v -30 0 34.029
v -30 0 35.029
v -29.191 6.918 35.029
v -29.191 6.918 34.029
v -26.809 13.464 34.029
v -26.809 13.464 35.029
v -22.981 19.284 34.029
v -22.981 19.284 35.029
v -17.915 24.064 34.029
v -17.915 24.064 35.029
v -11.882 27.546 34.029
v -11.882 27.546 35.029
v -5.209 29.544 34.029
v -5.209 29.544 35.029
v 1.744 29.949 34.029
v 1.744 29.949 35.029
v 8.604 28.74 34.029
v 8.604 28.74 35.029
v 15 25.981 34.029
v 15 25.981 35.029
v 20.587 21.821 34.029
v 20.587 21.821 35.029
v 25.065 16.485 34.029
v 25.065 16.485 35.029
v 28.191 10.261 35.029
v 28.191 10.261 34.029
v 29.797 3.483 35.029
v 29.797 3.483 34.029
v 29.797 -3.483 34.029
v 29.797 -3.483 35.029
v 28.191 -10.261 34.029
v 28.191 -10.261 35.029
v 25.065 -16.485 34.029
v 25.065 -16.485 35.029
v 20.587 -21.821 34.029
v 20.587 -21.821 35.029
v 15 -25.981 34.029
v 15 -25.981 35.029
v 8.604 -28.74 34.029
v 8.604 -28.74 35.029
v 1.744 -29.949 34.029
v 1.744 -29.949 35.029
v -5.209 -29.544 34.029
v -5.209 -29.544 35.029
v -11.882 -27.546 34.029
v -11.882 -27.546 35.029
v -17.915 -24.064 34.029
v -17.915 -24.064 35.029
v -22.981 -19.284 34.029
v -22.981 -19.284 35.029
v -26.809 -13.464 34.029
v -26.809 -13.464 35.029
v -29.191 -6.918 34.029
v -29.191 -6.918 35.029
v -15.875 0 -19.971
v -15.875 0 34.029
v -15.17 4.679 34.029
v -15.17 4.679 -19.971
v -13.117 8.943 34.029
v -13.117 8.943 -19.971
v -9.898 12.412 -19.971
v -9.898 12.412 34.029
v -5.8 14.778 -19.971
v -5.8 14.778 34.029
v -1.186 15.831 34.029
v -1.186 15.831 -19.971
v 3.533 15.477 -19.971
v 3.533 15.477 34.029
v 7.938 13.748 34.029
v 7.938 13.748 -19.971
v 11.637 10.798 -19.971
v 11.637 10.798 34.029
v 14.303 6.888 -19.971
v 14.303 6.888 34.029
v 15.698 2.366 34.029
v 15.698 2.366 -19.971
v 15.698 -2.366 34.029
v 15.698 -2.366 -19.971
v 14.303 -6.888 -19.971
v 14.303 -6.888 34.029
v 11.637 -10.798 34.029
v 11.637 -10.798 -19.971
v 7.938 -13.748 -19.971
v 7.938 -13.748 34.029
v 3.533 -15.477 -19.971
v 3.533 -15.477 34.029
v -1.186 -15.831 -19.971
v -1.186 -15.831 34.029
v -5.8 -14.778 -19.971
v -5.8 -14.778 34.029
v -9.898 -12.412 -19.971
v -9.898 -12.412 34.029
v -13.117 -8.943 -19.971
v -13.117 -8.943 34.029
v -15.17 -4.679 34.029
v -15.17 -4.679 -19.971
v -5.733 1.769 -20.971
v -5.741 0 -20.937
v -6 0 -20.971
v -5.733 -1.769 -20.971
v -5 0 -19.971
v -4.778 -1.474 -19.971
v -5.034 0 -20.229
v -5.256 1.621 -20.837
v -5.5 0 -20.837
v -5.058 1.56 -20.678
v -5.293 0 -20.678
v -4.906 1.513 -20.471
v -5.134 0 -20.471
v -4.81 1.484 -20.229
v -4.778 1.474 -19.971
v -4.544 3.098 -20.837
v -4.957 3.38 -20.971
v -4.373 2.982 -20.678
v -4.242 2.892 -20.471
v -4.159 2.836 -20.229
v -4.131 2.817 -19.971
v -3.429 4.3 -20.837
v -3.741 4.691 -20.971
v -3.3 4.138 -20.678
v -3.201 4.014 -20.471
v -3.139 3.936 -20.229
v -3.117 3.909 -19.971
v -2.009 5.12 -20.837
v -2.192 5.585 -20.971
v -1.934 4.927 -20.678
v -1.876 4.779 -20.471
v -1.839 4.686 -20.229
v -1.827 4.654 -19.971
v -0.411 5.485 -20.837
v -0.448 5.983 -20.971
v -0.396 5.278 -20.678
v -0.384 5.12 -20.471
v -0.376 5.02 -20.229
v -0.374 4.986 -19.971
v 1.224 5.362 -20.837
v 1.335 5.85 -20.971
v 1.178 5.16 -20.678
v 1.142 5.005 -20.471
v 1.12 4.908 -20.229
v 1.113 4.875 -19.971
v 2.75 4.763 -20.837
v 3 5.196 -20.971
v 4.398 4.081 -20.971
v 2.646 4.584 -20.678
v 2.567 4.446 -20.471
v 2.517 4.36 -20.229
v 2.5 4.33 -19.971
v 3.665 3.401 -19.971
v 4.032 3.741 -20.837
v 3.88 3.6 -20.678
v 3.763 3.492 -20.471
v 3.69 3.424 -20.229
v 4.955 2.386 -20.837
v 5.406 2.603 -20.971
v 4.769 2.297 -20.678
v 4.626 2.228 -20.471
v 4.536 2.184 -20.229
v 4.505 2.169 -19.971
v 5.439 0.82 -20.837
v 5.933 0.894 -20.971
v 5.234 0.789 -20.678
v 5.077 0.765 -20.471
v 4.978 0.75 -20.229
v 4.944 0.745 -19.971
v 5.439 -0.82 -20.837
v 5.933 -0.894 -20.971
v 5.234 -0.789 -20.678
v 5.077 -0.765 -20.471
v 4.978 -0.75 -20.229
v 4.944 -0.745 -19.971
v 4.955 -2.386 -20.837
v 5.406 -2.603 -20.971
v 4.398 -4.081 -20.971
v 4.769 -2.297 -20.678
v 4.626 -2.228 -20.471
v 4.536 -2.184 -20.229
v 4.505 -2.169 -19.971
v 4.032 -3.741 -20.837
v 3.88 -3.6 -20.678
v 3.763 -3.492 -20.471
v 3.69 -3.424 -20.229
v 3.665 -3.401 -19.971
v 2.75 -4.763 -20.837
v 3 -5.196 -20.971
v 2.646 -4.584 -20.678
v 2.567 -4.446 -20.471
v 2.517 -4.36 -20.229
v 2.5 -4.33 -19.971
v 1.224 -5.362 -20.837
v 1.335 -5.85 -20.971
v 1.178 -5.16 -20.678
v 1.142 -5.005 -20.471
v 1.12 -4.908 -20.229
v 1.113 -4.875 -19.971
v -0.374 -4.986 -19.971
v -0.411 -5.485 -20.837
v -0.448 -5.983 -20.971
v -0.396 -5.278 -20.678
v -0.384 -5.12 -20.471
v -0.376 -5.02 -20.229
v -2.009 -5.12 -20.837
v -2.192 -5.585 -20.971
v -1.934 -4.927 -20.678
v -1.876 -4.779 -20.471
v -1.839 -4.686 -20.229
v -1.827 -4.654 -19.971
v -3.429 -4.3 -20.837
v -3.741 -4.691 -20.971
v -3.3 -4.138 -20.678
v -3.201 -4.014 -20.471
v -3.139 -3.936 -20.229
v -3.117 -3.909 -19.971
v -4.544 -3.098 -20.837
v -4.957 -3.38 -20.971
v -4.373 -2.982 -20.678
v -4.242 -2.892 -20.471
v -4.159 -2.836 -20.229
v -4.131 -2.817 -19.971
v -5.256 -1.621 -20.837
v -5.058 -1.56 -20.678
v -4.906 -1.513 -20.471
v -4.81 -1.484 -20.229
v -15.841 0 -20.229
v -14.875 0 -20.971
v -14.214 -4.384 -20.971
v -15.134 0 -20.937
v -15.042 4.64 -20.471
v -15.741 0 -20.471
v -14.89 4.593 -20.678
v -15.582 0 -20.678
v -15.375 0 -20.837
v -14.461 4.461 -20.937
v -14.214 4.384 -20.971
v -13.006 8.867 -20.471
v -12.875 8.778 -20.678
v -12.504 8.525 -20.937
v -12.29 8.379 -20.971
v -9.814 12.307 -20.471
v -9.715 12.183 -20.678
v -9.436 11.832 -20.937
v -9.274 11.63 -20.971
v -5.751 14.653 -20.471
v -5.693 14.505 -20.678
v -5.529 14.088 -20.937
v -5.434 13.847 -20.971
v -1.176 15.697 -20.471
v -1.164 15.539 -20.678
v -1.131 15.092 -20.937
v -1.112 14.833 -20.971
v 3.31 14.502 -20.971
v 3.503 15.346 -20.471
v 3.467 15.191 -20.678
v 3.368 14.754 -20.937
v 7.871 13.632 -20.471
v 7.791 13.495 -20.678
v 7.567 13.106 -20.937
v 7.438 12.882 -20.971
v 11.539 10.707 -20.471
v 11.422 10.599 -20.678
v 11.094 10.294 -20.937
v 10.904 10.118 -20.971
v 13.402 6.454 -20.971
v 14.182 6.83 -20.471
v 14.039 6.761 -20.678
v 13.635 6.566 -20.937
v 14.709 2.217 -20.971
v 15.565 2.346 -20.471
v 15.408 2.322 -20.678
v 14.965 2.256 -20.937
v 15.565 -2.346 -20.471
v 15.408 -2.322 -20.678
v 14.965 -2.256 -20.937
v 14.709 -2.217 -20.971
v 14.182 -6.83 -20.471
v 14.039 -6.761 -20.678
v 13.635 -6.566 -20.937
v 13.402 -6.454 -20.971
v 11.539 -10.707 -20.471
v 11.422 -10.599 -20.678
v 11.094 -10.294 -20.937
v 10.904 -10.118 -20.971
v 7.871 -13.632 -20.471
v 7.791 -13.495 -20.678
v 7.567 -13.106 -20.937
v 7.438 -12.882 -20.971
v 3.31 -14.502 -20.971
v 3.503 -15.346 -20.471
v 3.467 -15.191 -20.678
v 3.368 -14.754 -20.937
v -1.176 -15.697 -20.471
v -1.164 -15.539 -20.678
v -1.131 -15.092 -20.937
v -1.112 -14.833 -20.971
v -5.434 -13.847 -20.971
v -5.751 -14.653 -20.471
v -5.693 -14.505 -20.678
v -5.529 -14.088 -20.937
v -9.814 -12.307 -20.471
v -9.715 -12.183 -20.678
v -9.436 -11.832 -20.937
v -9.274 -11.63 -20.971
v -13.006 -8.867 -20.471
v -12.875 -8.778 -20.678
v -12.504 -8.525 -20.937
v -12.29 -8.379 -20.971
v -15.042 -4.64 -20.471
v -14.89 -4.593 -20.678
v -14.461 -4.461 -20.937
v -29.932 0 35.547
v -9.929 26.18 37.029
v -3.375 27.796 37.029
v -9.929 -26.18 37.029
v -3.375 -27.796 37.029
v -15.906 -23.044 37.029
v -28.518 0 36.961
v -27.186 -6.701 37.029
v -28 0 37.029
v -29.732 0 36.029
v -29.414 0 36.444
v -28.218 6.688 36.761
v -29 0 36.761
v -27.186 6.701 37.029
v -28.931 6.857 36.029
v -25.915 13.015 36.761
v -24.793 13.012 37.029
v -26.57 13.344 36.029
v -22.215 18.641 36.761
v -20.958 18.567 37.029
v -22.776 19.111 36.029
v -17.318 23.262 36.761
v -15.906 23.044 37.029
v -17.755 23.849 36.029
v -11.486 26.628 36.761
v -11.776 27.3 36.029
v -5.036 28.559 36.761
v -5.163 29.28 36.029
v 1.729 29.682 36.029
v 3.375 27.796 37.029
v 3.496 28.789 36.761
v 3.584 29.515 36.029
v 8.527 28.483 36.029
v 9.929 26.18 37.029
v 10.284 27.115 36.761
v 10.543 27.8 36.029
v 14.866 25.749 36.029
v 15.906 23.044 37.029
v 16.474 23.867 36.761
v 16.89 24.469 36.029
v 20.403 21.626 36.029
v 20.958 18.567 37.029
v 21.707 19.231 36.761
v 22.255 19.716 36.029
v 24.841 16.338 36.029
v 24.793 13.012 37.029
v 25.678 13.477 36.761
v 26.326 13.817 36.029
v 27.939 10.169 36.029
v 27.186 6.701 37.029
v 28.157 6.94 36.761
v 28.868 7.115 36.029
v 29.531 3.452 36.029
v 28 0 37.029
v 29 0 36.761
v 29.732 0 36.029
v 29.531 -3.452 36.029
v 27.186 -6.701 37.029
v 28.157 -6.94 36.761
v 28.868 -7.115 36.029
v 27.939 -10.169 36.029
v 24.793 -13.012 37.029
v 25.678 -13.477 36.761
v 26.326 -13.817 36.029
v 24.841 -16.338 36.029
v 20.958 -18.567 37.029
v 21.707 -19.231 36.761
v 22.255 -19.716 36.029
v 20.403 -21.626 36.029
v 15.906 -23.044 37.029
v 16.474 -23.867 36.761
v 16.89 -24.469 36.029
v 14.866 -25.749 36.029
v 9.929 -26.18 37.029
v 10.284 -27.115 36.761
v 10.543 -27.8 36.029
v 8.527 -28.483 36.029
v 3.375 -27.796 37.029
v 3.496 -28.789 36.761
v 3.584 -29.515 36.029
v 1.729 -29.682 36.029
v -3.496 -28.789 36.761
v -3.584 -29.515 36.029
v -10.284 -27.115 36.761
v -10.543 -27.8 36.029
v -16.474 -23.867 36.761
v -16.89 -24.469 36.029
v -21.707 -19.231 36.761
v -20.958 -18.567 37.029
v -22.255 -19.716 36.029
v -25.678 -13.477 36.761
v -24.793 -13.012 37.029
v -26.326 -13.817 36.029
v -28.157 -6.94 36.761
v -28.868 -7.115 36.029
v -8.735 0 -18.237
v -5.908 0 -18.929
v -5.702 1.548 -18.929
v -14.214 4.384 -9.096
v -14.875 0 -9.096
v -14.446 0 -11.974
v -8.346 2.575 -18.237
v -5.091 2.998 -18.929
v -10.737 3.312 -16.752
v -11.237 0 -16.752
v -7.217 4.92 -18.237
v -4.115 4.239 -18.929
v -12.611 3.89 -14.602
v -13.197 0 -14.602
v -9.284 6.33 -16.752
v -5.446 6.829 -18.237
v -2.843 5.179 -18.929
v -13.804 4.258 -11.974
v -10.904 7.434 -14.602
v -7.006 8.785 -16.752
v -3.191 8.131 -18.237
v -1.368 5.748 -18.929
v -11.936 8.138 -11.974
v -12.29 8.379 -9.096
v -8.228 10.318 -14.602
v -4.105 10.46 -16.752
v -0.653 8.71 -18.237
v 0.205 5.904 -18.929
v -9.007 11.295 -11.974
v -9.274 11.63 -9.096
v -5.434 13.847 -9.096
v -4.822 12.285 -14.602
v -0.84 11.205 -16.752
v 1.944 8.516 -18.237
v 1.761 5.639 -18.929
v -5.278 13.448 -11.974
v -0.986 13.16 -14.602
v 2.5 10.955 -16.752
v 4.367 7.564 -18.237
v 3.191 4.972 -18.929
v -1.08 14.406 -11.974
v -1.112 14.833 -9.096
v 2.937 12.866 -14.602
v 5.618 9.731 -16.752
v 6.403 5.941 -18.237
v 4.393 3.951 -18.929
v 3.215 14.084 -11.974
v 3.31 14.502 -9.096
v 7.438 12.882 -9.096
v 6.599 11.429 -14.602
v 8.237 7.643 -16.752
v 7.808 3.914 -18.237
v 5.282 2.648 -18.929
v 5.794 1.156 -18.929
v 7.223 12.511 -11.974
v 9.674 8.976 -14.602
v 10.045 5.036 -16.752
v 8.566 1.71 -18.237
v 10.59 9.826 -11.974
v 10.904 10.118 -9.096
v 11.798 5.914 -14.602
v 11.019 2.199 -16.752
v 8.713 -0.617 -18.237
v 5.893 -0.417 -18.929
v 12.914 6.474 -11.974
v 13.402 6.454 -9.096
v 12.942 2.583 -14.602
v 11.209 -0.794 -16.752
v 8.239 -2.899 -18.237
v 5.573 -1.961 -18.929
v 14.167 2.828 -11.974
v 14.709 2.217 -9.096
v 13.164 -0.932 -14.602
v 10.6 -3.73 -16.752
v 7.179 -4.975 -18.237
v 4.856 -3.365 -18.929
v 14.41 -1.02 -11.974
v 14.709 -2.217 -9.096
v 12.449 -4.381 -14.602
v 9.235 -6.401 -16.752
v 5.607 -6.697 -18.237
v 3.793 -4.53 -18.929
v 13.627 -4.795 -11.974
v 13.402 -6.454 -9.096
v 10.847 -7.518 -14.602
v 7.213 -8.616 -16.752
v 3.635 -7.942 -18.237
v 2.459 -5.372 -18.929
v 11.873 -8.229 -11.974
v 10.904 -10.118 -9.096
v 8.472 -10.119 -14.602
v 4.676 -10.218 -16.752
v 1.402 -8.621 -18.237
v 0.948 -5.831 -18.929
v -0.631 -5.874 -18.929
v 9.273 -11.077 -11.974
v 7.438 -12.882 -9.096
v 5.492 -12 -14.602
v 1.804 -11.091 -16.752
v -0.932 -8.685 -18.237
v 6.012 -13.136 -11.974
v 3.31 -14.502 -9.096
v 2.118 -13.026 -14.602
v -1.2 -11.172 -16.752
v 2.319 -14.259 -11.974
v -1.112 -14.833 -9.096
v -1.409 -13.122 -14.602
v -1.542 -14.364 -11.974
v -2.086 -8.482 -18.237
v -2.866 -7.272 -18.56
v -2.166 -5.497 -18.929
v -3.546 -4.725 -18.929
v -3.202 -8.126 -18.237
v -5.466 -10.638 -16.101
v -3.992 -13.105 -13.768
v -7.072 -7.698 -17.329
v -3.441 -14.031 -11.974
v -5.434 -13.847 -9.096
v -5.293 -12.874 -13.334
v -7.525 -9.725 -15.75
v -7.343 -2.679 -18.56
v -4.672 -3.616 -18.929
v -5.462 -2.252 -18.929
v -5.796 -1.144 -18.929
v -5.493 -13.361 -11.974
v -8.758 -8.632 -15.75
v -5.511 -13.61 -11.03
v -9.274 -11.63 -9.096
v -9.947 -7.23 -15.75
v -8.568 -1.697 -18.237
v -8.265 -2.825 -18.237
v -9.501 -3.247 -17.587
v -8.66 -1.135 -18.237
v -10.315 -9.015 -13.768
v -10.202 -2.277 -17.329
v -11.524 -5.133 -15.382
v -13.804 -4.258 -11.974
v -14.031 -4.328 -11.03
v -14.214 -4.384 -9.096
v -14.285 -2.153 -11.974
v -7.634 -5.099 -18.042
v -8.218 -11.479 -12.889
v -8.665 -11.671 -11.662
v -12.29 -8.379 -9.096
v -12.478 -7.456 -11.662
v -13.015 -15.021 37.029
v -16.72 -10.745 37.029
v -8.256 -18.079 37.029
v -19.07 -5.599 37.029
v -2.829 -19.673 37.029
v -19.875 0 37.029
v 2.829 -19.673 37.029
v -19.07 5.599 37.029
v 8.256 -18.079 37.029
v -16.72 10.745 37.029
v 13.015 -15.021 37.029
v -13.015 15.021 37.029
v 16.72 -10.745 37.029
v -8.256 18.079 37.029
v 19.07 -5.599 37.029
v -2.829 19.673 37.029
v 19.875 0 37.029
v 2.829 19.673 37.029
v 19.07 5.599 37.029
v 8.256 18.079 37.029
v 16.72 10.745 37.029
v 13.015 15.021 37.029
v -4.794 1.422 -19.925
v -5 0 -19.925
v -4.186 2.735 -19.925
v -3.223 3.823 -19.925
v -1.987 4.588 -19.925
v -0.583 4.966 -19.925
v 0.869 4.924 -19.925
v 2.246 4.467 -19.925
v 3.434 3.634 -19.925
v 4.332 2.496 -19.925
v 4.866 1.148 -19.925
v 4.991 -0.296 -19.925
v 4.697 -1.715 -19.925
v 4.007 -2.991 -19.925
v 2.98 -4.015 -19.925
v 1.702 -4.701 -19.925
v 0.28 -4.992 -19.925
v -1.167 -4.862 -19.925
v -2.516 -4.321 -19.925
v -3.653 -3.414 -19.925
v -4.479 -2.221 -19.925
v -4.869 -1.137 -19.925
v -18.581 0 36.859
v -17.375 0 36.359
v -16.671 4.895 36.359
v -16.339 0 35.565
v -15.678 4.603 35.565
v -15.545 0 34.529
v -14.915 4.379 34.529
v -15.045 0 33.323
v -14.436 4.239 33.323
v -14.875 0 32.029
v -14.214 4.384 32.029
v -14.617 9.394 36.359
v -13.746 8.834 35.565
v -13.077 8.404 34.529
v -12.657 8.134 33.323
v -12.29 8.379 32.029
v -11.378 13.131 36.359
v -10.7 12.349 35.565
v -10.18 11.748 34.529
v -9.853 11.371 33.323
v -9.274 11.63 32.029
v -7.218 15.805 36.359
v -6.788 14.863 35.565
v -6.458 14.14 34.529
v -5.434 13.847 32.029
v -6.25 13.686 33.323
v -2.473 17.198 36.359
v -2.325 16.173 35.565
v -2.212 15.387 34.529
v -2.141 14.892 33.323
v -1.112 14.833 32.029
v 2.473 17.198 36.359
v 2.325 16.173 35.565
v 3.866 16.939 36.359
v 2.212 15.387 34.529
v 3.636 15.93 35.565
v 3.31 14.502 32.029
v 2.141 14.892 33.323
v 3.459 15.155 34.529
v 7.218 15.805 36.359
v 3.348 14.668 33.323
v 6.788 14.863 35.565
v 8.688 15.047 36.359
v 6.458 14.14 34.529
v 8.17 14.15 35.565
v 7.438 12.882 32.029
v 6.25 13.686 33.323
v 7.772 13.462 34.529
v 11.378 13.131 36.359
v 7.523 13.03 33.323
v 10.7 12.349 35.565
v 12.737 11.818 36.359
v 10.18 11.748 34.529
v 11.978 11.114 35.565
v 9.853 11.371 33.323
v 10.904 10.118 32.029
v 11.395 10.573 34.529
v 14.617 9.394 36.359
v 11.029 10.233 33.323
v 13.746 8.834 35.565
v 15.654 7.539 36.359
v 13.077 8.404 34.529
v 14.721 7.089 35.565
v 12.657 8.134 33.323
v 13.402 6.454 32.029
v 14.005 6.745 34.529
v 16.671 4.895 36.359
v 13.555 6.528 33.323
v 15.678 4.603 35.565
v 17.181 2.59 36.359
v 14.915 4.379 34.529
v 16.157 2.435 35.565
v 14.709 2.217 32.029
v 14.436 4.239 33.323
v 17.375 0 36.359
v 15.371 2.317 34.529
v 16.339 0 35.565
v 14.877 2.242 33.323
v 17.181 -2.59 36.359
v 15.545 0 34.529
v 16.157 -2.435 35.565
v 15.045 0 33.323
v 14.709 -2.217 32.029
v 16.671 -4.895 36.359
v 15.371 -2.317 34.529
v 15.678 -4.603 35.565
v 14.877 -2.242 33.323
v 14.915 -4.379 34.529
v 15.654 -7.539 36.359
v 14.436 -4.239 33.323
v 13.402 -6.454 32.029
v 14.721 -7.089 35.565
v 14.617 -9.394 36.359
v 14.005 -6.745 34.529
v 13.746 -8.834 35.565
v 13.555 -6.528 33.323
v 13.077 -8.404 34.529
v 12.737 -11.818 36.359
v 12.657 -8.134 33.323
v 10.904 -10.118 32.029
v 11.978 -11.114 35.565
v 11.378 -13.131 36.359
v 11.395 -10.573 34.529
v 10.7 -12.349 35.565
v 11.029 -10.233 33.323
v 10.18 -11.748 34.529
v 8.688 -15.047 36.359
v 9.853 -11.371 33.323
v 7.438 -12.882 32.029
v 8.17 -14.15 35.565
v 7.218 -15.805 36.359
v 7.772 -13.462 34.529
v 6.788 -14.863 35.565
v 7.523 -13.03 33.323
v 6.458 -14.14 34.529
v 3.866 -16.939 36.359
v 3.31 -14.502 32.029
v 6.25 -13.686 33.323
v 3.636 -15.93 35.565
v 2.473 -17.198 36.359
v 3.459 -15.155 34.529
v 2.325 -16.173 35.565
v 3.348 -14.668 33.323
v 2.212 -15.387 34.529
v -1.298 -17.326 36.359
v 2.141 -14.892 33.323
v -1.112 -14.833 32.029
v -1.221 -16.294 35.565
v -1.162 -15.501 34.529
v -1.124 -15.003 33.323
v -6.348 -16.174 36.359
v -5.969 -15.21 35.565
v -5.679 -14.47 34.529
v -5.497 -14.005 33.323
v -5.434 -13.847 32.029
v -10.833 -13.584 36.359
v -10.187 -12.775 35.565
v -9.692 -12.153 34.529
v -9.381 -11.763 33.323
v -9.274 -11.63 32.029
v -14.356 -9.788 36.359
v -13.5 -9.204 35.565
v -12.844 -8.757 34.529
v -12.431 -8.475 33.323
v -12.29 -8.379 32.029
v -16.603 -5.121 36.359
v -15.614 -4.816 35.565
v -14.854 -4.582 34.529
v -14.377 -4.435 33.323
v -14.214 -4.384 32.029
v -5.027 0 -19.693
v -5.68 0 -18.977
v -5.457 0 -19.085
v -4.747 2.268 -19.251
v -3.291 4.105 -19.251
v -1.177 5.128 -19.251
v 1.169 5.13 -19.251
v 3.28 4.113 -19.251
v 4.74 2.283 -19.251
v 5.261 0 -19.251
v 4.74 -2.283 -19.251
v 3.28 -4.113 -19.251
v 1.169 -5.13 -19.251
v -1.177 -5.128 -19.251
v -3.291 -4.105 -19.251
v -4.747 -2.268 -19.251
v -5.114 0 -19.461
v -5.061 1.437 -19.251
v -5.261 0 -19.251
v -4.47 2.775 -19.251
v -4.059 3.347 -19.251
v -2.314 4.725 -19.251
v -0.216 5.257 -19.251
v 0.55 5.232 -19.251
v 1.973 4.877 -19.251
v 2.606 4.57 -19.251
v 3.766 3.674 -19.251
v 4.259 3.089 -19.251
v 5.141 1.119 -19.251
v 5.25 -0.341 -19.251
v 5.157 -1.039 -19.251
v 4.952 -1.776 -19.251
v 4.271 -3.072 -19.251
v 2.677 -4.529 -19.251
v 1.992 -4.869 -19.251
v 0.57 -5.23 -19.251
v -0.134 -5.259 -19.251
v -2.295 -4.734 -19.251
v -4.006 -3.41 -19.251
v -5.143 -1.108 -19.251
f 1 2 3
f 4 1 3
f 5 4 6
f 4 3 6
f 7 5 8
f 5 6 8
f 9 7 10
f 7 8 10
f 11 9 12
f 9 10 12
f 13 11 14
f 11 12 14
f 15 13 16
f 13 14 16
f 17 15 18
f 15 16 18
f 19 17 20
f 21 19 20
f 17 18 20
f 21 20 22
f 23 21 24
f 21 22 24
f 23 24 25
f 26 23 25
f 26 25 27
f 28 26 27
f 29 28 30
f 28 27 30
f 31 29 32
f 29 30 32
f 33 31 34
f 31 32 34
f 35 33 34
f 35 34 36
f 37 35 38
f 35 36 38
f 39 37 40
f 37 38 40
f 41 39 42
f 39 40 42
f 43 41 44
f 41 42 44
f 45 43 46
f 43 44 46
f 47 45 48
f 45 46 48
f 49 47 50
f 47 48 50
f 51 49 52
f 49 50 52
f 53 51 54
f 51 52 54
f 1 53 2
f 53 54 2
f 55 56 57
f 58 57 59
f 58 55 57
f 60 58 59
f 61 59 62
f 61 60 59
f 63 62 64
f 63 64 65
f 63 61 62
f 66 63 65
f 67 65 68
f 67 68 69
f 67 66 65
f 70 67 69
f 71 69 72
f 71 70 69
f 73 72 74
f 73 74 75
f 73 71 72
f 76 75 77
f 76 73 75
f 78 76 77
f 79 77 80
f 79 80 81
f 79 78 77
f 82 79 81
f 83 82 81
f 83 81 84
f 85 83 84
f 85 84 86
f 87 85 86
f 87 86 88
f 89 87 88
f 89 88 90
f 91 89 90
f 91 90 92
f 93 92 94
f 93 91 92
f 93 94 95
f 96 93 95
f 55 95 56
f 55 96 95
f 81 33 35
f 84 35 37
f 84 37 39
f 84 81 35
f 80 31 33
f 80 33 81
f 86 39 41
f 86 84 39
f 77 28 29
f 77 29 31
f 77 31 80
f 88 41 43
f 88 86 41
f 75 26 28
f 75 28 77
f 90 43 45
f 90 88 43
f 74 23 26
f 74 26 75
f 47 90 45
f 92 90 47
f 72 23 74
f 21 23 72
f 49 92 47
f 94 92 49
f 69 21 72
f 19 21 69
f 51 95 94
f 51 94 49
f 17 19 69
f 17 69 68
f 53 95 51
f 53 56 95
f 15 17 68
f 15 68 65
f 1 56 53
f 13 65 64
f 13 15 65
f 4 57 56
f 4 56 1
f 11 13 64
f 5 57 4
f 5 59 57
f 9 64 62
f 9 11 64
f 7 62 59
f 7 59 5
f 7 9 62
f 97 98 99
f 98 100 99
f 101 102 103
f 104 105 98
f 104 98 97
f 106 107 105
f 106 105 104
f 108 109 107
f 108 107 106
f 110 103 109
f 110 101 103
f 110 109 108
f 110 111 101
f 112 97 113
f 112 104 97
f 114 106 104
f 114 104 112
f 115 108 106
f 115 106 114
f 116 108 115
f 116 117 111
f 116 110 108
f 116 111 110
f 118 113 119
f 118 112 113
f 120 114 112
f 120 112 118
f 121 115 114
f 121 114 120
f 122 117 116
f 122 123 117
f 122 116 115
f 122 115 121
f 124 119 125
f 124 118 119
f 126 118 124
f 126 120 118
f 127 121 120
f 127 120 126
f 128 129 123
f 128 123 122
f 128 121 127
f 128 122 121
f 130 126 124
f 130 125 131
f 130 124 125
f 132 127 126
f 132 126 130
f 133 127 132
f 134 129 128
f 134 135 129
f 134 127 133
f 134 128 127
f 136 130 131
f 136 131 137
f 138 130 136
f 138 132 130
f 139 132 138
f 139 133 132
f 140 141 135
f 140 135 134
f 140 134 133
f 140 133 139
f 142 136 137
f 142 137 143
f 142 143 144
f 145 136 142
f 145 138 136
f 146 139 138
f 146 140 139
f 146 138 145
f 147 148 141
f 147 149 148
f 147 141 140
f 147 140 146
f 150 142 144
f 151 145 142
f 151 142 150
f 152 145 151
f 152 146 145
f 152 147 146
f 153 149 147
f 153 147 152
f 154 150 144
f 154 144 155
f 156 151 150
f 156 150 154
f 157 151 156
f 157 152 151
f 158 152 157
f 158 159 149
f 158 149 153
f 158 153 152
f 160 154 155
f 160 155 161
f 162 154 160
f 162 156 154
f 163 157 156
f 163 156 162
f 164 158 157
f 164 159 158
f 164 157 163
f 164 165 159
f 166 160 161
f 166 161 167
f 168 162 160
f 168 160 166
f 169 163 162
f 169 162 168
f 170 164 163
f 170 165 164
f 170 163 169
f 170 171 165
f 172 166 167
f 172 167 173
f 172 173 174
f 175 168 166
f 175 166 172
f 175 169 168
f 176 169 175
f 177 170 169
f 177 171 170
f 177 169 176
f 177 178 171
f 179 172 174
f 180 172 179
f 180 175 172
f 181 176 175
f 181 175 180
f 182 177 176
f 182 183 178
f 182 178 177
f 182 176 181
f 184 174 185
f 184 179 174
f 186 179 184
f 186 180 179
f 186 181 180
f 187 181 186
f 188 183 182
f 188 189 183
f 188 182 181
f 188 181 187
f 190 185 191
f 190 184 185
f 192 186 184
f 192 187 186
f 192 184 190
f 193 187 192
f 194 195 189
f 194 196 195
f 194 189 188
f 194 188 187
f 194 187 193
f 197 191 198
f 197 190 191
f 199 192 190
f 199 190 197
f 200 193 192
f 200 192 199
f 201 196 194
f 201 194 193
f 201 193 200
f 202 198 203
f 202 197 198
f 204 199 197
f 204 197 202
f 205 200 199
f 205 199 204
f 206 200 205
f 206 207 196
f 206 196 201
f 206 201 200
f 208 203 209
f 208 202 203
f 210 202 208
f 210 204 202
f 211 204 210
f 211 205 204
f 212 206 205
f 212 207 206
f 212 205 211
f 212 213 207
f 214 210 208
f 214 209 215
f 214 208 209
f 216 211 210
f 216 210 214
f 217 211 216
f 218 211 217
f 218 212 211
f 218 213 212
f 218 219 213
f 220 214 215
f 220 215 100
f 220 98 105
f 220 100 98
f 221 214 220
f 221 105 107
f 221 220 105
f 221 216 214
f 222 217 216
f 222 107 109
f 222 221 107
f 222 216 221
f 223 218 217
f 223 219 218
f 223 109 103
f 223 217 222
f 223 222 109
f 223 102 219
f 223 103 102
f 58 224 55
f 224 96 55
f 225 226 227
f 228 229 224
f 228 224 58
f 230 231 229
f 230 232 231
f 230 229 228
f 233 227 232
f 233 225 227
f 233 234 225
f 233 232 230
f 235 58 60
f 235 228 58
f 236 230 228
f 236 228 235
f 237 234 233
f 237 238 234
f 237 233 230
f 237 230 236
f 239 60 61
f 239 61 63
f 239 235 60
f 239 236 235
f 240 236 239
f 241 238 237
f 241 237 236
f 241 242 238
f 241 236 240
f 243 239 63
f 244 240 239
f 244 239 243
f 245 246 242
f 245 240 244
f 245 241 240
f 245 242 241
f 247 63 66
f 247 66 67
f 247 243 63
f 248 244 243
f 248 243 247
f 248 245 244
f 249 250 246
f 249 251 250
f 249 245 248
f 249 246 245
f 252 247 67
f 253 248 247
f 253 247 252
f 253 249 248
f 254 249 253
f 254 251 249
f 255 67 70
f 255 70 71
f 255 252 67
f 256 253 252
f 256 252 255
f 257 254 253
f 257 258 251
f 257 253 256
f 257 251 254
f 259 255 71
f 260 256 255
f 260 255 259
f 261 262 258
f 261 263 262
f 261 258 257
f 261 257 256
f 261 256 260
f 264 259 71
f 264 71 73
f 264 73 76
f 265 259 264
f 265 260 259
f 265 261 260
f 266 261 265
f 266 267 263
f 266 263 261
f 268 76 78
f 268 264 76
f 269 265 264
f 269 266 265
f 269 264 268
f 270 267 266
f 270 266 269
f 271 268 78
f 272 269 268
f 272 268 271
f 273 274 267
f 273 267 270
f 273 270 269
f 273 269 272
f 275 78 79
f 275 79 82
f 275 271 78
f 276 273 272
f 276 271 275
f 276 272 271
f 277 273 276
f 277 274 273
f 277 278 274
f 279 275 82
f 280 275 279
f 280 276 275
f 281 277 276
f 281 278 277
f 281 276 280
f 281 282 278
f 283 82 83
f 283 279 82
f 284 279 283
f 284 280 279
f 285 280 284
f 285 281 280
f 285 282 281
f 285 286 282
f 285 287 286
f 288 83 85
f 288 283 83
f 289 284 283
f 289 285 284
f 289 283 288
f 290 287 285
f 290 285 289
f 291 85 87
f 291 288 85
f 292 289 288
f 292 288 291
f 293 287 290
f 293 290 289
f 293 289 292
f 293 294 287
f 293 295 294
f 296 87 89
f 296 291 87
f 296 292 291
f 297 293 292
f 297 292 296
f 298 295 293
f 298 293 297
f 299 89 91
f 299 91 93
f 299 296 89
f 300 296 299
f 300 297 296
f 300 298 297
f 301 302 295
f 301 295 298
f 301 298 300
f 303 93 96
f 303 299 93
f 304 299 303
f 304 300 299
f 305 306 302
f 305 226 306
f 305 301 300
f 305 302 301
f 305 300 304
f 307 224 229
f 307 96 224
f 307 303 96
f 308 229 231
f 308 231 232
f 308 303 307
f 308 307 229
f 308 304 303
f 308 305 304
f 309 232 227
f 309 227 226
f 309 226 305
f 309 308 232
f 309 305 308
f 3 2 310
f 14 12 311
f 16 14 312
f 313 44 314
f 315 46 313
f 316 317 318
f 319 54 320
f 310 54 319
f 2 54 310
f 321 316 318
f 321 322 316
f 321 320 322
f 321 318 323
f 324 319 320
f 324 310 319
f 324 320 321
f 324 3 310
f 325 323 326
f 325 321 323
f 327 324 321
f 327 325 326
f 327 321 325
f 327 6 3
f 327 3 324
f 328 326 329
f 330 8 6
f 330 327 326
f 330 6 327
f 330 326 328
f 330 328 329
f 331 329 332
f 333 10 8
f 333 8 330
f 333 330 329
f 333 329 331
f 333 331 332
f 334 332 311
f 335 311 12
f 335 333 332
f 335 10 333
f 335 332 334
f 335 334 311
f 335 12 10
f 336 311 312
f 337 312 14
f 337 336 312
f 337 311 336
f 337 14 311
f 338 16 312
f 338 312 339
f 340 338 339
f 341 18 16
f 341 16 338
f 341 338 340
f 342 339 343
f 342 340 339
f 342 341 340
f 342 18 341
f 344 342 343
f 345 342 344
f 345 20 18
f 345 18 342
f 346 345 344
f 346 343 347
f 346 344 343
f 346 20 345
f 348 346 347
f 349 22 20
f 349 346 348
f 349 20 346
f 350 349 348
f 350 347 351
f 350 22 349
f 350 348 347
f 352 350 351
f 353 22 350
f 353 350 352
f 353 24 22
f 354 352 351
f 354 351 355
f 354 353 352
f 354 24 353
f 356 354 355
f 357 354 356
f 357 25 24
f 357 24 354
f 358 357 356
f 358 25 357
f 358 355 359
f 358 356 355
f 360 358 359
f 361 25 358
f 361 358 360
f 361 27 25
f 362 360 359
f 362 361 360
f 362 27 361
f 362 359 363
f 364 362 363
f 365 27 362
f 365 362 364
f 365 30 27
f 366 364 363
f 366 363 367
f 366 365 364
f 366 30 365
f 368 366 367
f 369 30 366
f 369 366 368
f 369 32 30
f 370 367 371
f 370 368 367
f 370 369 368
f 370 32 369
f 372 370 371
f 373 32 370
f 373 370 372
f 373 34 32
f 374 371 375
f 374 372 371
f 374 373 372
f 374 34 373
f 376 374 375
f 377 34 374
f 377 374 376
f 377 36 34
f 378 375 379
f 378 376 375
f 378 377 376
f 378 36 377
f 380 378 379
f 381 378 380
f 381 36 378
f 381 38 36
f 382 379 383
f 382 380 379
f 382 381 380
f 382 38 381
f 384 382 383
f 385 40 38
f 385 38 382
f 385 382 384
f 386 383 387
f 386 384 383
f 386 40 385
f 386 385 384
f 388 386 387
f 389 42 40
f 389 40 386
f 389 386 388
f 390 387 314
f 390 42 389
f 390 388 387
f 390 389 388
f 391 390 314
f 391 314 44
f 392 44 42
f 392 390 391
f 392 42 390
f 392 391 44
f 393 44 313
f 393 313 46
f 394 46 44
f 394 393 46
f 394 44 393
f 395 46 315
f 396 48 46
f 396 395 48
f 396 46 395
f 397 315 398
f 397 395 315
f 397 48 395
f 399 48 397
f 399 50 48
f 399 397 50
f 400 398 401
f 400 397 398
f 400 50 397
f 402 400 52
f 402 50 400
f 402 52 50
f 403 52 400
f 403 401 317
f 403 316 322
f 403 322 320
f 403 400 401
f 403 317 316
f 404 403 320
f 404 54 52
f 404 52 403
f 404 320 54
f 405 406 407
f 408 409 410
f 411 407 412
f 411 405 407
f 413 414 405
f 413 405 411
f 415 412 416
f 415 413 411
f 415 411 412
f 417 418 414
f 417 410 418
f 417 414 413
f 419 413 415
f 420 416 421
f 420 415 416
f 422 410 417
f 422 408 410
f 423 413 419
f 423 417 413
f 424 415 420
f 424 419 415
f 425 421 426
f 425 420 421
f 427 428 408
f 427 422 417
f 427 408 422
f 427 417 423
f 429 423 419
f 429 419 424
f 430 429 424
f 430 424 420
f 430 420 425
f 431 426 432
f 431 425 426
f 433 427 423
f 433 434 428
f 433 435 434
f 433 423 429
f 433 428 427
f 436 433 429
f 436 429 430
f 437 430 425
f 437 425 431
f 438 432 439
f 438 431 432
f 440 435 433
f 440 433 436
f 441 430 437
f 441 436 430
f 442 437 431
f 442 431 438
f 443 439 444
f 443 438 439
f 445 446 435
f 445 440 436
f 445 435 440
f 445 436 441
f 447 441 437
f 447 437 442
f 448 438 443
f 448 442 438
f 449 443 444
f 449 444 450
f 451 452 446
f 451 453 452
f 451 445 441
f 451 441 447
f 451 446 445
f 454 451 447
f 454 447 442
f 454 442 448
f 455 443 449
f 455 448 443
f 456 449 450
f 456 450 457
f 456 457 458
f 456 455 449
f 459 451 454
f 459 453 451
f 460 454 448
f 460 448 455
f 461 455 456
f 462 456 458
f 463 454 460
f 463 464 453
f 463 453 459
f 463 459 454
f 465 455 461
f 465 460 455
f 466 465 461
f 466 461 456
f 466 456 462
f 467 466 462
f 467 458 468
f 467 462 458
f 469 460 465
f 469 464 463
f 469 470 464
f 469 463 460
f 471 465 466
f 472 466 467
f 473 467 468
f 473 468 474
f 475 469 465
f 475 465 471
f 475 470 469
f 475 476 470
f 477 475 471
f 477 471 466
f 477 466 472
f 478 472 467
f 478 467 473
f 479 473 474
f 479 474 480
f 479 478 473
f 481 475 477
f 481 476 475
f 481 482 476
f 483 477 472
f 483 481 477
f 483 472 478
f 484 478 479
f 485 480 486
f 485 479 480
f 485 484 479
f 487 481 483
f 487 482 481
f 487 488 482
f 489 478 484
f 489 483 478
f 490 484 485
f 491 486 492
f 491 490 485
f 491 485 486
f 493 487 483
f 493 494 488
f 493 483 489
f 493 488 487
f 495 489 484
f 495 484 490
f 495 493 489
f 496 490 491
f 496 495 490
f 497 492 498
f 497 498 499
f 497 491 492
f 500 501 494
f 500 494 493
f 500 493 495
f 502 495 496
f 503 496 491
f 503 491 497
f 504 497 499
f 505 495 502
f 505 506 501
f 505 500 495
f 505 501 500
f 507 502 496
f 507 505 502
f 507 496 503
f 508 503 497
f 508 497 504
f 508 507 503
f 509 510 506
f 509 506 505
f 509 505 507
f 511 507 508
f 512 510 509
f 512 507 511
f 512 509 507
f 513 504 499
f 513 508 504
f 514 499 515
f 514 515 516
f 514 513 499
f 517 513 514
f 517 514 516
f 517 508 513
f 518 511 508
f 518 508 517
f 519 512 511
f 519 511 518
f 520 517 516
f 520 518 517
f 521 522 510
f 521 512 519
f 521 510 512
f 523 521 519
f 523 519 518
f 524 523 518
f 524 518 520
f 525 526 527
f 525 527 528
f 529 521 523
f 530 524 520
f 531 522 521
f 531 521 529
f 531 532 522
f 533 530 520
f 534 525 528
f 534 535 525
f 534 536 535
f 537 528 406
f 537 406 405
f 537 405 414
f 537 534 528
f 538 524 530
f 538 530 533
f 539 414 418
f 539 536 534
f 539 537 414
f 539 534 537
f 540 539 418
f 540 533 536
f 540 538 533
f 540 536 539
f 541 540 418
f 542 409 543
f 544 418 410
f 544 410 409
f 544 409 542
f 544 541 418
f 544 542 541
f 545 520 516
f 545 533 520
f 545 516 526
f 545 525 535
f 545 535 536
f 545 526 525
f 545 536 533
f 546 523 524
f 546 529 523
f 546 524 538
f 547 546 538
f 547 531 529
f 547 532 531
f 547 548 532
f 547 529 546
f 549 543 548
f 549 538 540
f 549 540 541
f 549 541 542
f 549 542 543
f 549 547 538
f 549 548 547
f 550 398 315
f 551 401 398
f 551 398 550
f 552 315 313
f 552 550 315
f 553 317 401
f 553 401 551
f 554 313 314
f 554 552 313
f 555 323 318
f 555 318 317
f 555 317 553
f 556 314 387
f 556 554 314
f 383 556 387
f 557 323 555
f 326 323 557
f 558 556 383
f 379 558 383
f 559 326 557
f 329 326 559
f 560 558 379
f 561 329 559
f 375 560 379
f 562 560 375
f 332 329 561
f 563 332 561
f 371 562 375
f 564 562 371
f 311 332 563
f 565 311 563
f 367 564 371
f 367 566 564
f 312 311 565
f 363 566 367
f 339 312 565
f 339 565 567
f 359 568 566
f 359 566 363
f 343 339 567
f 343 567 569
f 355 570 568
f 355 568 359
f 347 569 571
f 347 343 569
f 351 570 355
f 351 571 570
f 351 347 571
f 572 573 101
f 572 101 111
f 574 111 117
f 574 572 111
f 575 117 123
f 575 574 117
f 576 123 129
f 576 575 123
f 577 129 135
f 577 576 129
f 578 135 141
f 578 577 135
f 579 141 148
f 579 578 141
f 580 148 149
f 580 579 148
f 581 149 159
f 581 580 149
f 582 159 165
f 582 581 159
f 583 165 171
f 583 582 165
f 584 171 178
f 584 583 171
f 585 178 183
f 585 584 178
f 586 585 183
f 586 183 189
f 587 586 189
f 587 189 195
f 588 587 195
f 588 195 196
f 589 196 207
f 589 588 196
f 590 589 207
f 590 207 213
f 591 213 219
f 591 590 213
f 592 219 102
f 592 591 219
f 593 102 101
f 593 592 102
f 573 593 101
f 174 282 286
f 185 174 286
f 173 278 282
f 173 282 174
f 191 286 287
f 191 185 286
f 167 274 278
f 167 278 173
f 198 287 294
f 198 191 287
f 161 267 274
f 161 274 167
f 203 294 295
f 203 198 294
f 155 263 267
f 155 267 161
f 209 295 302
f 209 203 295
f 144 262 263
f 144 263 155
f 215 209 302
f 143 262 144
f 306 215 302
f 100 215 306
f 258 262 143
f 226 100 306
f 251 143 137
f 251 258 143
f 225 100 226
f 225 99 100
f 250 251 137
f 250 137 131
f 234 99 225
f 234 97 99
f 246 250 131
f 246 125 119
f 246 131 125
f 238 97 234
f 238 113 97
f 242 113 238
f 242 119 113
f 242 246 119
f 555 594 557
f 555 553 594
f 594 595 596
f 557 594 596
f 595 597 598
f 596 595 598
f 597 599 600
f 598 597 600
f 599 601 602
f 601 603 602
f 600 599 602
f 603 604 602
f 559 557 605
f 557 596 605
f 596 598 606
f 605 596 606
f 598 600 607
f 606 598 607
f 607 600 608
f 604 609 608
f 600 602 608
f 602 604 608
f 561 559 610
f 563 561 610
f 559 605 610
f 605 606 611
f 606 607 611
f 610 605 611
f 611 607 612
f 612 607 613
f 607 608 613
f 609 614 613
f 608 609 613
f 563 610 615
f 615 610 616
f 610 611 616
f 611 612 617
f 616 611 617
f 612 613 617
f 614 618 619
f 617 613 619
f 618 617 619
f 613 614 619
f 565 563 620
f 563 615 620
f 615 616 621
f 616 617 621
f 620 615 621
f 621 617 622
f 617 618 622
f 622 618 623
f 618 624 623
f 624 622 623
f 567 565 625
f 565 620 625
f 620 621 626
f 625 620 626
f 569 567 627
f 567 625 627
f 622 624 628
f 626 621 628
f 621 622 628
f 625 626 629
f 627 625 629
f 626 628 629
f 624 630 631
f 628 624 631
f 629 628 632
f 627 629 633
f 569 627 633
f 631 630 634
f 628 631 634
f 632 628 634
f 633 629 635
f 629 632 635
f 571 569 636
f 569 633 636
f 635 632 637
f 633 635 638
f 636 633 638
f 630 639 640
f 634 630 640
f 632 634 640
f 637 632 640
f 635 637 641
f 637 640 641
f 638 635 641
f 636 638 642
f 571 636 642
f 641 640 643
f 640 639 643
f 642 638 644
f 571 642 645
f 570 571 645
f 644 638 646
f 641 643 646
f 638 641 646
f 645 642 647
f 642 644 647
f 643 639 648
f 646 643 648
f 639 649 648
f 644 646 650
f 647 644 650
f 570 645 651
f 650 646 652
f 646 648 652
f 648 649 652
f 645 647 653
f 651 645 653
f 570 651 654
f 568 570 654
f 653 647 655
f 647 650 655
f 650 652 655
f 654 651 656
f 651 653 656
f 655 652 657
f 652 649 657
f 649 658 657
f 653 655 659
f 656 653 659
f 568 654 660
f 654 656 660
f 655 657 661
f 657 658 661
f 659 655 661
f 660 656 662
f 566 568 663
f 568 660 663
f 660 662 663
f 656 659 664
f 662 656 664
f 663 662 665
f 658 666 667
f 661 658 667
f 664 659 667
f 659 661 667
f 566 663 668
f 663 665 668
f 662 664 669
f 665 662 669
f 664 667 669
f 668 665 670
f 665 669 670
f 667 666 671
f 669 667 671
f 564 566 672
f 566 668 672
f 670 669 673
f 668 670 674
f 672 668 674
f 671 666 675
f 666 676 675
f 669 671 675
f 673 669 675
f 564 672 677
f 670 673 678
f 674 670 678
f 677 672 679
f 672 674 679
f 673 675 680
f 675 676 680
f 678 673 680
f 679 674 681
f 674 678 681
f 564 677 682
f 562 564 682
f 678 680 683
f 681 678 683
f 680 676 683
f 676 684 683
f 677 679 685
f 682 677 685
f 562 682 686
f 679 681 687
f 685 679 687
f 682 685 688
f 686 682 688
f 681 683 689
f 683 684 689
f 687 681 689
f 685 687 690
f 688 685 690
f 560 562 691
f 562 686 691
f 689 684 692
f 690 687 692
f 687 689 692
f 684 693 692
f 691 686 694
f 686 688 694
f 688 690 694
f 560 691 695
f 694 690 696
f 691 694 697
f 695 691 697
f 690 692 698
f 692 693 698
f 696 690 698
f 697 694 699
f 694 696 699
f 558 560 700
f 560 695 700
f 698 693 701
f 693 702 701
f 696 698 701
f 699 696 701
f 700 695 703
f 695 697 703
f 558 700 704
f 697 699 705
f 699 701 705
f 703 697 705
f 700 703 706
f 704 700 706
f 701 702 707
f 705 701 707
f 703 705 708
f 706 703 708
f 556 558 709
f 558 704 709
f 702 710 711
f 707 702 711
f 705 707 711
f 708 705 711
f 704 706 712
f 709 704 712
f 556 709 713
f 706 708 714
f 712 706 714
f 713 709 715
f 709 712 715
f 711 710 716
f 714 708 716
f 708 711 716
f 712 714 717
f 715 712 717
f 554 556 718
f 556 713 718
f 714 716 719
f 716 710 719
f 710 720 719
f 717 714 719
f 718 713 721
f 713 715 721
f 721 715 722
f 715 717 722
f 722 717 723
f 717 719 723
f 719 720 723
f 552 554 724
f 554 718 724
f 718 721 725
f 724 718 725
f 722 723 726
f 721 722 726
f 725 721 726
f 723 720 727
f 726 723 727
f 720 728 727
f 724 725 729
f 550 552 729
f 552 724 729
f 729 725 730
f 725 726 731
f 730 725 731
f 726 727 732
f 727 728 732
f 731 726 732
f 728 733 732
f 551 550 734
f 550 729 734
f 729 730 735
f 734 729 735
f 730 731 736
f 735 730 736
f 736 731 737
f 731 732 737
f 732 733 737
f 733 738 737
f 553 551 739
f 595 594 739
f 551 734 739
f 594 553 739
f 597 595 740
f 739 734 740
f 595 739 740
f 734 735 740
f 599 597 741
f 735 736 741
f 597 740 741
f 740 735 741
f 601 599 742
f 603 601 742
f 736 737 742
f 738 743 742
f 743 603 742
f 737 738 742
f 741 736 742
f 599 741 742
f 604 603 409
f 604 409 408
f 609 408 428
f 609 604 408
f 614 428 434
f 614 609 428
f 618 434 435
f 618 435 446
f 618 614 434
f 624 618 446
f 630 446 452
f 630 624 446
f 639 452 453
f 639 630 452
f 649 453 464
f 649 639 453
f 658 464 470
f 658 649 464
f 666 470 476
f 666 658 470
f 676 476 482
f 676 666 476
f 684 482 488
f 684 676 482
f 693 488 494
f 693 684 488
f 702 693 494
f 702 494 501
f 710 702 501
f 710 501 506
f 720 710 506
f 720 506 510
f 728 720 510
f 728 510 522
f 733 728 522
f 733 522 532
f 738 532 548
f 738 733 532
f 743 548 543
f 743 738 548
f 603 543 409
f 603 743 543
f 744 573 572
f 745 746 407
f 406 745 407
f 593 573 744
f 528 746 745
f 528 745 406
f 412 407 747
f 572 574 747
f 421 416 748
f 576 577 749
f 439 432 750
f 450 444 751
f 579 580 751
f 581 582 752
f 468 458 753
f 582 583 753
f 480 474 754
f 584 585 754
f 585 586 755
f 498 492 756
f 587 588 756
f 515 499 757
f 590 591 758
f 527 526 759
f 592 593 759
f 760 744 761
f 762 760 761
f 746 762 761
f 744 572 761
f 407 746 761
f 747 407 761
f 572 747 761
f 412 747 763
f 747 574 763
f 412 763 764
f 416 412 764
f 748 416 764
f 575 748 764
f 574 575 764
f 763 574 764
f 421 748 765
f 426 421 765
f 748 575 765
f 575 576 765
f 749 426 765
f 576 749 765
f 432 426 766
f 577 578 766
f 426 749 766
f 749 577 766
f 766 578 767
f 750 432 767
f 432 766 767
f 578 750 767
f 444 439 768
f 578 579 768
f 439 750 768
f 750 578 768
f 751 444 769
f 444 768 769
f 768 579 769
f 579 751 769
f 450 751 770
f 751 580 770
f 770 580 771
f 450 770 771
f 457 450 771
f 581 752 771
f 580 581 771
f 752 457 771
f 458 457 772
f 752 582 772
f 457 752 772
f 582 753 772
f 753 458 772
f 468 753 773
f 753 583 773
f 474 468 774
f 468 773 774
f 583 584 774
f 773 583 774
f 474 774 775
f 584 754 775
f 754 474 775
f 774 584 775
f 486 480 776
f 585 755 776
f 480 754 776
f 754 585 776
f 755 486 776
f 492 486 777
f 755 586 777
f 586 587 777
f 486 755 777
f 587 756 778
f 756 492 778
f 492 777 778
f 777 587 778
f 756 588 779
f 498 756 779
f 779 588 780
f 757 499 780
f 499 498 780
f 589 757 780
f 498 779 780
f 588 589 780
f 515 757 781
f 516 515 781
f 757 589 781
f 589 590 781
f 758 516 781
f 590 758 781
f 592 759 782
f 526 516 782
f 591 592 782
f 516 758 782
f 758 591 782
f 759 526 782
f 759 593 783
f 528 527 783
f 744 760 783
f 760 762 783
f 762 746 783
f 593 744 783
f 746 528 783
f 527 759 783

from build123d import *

# Parameters (mm, degrees)
F0_W   = 14.125
F0_H   = 3
F0_W_2 = 9.875
F0_H_2 = 2
F0_W_3 = 1
F2_R   = 1
F3_R   = 5
F4_R   = 2


with BuildPart() as f1:
    # F0 (on Front) → F1 (revolve)
    with BuildSketch(Plane.XZ):
        Polygon((-14.875, -9.095676), (-14.875, 34.029324), (-15.875, 34.029324), (-15.875, -20.970676), (-14.875, -20.970676), (-14.875, -18.970676), align=None)
        with Locations((-22.9375, 35.529324)):
            Rectangle(F0_W, F0_H)
        with Locations((-9.9375, -19.970676)):
            Rectangle(F0_W_2, F0_H_2)
        with Locations((-15.375, 35.529324)):
            Rectangle(F0_W_3, F0_H)
        with BuildLine():
            ThreePointArc((-5, -18.970676), (-11.982679, -16.078356), (-14.875, -9.095676))
            Line((-14.875, -9.095676), (-14.875, -18.970676))
            Line((-14.875, -18.970676), (-5, -18.970676))
        make_face()
    revolve(axis=Axis((0, 0, 3.538087), (0, 0, -1)))

    # F2
    f2_edges = [f1.edges().sort_by_distance(p)[0] for p in [
        (5, 0, -20.970676),
        (5, 0, -18.970676),
        (15.875, 0, -20.970676),
    ]]
    fillet(f2_edges, radius=F2_R)

    # F3
    f3_edges = [f1.edges().sort_by_distance(p)[0] for p in [
        (14.875, 0, 37.029324),
    ]]
    fillet(f3_edges, radius=F3_R)

    # F4
    f4_edges = [f1.edges().sort_by_distance(p)[0] for p in [
        (30, 0, 37.029324),
    ]]
    fillet(f4_edges, radius=F4_R)


solid = f1.part
